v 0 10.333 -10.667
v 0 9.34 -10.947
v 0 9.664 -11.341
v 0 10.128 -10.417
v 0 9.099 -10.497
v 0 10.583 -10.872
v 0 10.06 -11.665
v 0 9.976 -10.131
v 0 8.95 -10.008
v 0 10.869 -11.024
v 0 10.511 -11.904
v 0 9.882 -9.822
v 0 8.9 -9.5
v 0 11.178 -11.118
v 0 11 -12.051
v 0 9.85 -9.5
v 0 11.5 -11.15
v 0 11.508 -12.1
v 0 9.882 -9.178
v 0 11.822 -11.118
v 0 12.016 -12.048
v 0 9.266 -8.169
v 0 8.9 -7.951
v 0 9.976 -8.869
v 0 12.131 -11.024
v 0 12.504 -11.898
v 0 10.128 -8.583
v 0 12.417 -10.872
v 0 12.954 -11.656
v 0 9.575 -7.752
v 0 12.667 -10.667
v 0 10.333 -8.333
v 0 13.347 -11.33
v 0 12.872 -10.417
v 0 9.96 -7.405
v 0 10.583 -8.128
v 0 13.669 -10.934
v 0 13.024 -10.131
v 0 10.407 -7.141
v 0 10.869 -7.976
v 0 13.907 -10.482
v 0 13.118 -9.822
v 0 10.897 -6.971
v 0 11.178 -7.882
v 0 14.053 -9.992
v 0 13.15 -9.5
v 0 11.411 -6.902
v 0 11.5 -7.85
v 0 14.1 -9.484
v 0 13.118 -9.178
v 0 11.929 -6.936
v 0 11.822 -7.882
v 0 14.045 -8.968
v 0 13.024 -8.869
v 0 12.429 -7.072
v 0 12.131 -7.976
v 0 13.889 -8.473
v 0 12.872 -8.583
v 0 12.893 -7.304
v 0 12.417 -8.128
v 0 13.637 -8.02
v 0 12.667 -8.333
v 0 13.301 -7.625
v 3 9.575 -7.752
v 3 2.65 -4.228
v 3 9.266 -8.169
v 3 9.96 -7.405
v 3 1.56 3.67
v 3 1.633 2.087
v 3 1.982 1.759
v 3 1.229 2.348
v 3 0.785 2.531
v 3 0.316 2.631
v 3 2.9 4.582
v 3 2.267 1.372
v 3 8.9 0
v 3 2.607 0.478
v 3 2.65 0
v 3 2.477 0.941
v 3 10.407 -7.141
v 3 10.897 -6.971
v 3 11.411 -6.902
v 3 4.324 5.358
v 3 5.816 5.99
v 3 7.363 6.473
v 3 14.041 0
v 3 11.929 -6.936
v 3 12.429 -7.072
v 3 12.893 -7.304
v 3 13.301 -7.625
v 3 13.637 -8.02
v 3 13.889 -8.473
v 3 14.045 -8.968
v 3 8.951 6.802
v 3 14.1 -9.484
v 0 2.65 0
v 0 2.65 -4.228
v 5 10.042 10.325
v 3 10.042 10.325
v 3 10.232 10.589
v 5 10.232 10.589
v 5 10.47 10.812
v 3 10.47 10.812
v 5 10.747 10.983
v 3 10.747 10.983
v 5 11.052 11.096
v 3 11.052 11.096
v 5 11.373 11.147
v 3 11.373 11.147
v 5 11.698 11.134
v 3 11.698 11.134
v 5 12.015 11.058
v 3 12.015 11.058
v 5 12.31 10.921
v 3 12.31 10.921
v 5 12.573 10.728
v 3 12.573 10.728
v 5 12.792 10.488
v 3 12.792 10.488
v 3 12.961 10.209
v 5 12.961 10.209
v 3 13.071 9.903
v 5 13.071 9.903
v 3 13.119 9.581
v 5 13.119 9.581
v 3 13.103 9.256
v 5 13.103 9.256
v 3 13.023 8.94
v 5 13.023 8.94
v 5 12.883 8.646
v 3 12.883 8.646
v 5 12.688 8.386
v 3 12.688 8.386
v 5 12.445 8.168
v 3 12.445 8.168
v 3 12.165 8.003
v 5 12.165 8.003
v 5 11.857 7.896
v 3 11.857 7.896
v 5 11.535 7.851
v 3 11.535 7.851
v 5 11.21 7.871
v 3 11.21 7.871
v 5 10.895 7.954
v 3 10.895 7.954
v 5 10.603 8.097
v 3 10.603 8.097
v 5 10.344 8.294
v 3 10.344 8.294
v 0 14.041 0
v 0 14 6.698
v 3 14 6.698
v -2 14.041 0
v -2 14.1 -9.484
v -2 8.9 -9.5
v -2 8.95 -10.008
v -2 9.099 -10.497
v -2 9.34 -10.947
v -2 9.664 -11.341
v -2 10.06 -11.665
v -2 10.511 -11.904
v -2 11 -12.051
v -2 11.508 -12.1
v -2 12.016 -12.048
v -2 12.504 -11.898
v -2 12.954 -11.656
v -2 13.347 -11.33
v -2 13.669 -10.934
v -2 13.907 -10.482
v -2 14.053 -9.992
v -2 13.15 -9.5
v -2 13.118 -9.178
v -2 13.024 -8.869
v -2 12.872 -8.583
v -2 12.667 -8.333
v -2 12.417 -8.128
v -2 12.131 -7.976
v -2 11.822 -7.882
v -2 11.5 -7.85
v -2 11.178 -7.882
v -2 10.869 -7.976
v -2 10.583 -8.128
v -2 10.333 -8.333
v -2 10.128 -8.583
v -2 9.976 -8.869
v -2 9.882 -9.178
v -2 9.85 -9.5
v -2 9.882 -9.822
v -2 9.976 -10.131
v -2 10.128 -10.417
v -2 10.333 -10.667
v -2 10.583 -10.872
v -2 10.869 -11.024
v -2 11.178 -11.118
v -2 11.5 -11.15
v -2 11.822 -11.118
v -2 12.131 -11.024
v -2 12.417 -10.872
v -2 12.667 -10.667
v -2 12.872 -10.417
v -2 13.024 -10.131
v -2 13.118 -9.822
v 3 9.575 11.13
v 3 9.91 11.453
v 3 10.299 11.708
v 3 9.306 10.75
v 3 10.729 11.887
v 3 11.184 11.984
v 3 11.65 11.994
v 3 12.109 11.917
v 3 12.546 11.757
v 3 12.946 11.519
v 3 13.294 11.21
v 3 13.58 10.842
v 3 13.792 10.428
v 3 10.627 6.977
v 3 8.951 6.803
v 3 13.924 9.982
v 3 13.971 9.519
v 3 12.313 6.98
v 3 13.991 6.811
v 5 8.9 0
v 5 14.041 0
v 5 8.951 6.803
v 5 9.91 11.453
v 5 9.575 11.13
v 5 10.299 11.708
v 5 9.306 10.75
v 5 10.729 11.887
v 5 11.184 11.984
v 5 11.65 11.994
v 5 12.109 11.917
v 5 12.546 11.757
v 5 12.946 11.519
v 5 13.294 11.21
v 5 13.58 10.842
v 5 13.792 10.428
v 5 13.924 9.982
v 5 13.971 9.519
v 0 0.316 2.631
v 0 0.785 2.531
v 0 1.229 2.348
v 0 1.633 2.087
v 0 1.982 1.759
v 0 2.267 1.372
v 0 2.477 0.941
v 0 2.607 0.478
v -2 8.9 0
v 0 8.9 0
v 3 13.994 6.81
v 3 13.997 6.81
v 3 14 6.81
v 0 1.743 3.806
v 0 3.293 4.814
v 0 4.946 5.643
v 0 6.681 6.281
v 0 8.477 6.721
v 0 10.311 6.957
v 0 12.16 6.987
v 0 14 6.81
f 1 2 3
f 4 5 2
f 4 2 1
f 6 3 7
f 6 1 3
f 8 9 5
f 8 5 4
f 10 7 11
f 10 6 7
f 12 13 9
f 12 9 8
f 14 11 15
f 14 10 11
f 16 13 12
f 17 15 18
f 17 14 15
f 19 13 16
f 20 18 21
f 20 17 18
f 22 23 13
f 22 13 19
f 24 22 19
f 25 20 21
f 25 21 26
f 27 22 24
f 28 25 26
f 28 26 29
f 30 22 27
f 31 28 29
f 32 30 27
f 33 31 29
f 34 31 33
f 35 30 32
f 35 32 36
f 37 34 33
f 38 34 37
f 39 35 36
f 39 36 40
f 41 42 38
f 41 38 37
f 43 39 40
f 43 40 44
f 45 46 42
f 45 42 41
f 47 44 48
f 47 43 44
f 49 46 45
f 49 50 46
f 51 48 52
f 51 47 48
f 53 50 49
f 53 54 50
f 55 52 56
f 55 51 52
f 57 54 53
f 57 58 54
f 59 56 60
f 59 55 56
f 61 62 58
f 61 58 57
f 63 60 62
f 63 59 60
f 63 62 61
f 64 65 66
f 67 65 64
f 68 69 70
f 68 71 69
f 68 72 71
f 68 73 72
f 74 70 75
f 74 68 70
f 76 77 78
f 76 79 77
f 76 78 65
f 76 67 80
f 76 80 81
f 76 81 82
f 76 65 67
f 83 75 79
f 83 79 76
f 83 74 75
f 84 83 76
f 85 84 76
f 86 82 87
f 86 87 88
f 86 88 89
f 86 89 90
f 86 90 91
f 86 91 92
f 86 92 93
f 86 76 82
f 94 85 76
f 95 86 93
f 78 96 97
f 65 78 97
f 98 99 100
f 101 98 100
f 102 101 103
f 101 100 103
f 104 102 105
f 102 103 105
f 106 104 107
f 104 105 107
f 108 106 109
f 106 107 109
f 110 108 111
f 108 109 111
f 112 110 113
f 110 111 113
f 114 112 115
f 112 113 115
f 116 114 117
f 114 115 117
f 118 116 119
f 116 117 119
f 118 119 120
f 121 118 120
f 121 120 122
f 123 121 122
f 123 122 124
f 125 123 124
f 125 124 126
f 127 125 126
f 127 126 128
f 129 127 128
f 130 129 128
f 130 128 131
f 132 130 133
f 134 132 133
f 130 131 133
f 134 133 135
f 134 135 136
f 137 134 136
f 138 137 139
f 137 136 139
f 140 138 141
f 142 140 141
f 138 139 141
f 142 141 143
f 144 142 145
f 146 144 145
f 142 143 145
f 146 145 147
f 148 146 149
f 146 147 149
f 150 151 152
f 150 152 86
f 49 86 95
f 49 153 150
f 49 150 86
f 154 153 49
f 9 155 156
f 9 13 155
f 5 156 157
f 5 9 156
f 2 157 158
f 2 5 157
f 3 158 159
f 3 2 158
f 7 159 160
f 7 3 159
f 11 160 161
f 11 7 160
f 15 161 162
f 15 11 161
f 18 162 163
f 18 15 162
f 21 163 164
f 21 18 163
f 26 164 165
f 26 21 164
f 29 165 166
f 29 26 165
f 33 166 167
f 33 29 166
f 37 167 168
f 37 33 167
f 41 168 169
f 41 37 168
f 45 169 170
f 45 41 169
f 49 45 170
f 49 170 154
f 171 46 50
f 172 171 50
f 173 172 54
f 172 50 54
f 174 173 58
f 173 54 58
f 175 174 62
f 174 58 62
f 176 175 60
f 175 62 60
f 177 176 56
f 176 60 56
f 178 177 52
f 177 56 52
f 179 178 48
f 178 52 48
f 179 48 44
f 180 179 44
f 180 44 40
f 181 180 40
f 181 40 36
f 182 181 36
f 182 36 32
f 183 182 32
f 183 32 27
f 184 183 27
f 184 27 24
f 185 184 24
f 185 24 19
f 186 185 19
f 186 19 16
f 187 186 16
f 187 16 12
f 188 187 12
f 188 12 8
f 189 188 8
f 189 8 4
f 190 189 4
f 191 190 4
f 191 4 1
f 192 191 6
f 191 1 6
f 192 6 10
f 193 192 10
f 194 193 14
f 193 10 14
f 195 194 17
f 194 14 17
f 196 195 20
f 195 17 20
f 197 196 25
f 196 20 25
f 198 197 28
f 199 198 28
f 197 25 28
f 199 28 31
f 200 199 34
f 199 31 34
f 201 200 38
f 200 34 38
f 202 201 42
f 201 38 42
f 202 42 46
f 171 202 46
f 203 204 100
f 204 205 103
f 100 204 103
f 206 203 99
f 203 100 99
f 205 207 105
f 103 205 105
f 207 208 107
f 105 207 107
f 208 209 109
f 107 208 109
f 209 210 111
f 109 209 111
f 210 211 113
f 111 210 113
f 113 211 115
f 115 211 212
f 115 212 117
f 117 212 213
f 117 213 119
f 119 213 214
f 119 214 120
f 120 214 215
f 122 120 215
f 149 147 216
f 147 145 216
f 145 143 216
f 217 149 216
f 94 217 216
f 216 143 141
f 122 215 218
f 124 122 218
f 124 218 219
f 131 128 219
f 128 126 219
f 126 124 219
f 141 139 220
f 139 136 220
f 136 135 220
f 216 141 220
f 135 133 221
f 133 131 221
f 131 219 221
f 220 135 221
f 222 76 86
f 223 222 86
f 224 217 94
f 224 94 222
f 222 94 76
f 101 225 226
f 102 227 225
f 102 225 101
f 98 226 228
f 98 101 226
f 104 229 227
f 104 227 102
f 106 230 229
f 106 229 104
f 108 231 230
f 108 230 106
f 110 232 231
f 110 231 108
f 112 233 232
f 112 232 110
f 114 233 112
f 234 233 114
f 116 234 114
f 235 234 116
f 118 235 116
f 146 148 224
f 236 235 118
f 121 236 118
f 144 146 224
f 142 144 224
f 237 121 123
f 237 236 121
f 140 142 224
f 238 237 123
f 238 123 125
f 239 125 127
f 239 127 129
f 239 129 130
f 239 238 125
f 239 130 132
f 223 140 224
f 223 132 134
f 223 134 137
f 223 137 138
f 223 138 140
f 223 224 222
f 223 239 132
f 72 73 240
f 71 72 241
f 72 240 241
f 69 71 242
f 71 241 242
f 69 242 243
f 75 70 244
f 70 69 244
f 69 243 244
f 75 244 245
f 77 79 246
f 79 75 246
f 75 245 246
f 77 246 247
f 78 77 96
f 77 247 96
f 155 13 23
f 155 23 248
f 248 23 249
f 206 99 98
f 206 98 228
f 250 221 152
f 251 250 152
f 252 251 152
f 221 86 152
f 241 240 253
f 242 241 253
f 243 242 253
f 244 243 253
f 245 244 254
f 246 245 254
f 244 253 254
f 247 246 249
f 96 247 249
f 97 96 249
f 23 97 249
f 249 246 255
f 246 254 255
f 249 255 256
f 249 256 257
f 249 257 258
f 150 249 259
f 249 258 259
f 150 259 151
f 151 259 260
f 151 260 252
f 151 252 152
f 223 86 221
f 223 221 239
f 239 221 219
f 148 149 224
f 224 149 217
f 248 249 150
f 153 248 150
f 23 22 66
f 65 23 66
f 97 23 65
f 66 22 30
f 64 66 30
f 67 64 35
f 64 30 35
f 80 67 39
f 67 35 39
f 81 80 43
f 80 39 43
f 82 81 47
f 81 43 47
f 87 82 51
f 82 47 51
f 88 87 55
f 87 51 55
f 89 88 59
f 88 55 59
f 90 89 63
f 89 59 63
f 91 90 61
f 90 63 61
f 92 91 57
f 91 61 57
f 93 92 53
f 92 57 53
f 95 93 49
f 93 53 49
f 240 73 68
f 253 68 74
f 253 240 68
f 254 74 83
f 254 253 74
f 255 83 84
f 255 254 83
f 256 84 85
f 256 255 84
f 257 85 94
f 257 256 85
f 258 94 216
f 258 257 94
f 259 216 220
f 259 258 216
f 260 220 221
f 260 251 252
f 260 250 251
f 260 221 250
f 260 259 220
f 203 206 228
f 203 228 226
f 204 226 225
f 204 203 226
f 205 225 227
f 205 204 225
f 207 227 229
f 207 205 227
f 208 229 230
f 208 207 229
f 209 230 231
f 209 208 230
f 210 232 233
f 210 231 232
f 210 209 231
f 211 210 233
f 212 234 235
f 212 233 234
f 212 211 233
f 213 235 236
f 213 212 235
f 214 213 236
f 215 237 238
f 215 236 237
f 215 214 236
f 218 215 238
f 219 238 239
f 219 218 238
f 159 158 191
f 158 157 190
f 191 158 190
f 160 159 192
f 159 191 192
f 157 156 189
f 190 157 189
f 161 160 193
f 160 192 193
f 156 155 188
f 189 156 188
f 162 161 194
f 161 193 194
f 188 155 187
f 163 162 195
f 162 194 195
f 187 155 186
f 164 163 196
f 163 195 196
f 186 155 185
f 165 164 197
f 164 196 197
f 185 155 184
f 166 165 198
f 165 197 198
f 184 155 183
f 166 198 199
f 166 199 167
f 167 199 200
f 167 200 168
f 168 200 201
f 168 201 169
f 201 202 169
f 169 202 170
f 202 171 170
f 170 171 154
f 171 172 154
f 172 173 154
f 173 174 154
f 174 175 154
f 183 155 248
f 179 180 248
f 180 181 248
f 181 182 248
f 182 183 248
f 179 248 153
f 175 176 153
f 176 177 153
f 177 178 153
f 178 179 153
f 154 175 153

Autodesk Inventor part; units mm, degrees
ref_plane "YZ Plane" through (0, 0, 0) normal (1, 0, 0) x (0, 1, 0)
ref_plane "XZ Plane" through (0, 0, 0) normal (0, 1, 0) x (-1, 0, 0)
ref_plane "XY Plane" through (0, 0, 0) normal (0, 0, 1) x (1, 0, 0)
sketch "スケッチ1" plane through (0, 0, 0) normal (1, 0, 0) x (0, 1, 0)
  line L0 (0, 0) -> (0, 6)
  line L1 (0, 6) -> (0, -6)
  line L2 (0, 0) -> (11.5, 0)
  line L3 (11.5, 0) -> (11.5, 9.5)
  line L4 (11.5, 9.5) -> (11.5, -9.5)
  circle A0 centre (0, 6) radius 1.25
  circle A1 centre (0, -6) radius 1.25
  circle A2 centre (11.5, 9.5) radius 1.65
  circle A3 centre (11.5, -9.5) radius 1.65
  circle A4 centre (11.5, 9.5) radius 2.5
  circle A5 centre (11.5, -9.5) radius 2.5
  circle A6 centre (0, 0) radius 2.65
  line L5 (0, 0) -> (-14.6, 0)
  circle A7 centre (-14.6, 0) radius 1.65
  circle A8 centre (-14.6, 0) radius 2.5
  circle A9 centre (0, 6) radius 2
  circle A10 centre (0, -6) radius 2
  line L6 (0, 8) -> (10.6499, 11.851)
  line L7 (0, -8) -> (10.6499, -11.851)
  line L8 (-14.6, 0) -> (-14.6, -2.5)
  line L9 (-14.6, 0) -> (-12.1, 0) construction
  line L10 (-14.6, -2.5) -> (-14.6, 2.5)
  line L11 (-14.6, -2.5) -> (-0.7212, -7.8655)
  line L12 (-14.6, 2.5) -> (-0.7212, 7.8655)
  circle A11 centre (11.5, -9.5) radius 14.9164
  line L13 (11.5, -9.5) -> (0, 0)
  line L14 (11.5, -9.5) -> (0, -2.65)
  line L15 (14, 9.5) -> (14, 6.6979)
  circle A12 centre (11.5, -9.5) radius 16.7294
  circle A13 centre (11.5, -9.5) radius 2.6
  circle A14 centre (11.5, -9.5) radius 16.5
  line L16 (14, 6.6979) -> (14.1, -9.4839)
  line L17 (8.9, -9.5) -> (8.9, 0)
  line L18 (9, 9.5) -> (9, 0)
  line L19 (14.0414, 0) -> (11.5, 0)
  line L20 (2.65, 0) -> (2.65, -4.2285)
  point P0 (9.3522, -8.2206)
  point P1 (0, 2.65)
  point P2 (12.4812, 7.2006)
  point P3 (14, 6.8095)
  point P4 (0.3158, 2.6311)
  point P5 (9.2662, -8.1695)
  dimension "d9" = 5
  dimension "d0" = 6
  dimension "d1" = 12
  dimension "d2" = 11.5
  dimension "d3" = 9.5
  dimension "d4" = 19
  dimension "d5" = 2.5
  dimension "d6" = 3.3
  dimension "d7" = 3.3
  dimension "d8" = 5
  dimension "d10" = 5.3
  dimension "d11" = 14.6
  dimension "d12" = 3.3
  dimension "d13" = 5
  dimension "d14" = 4
  dimension "d15" = 4
  dimension "d16" = 90
  dimension "d21" = 5.2
  dimension "d22" = 33
extrude "押し出し3" add sketch "スケッチ1" along normal blind 3 contours A6 A11 L18 L2 | L2 L17 L13 L20 | A6 A14 L18 A11 | L20 L13 L17 L14 | L2 L4 A13 L13 L17 | L18 A14 L3 A11 | A11 L3 L2 L18 | L17 L13 A13 L14 | A11 L16 L19 L3 | L3 A14 L15 L16 A11 | L19 L16 A13 L4
extrude "押し出し4" add sketch "スケッチ1" against normal blind 2 contours L2 L4 A13 L13 L17 | L17 L13 A13 L14 | L14 A13 L17 | A13 L13 A5 L14 | L14 A5 L7 A13 | L19 L16 A13 L4 | A13 L4 A5 L13 | L7 A5 L4 A13 | L14 A3 L4 A5 | A5 L13 A3 L14 | A5 L4 A3 L13
sketch "スケッチ2" plane through (3, 0, 0) normal (1, 0, 0) x (0, 0, -1)
  line L0 (0, 0) -> (0, 11.4707)
  line L1 (0, 14.0414) -> (0, 8.9) projected
  line L2 (0, 11.4707) -> (-9.5, 11.4707)
  circle A0 centre (-9.5, 11.4707) radius 1.65
  circle A1 centre (-9.5, 11.4707) radius 2.5
  line L3 (-9.5186, 8.9708) -> (0, 8.9)
  line L4 (0, 11.4707) -> (0, 14.0414)
  line L5 (0, 14.0414) -> (-6.6979, 14) projected
  line L6 (0, 14.0414) -> (-9.5186, 13.9706)
  line L7 (-9.5, 11.4707) -> (-6.8033, 8.9506)
  line L8 (-9.5, 11.4707) -> (-12, 11.4707)
  line L9 (0, 8.9) -> (7.9513, 8.9) projected
  line L10 (-9.5, 11.4707) -> (-10.75, 9.3056)
  point P0 (-11.15, 11.4707)
  point P1 (-8.2945, 10.3441)
  point P2 (-10.325, 10.0417)
  dimension "d27" = 9.5
  dimension "d28" = 3.3
  dimension "d29" = 5
extrude "押し出し5" add sketch "スケッチ2" along normal blind 2 contours L3 L7 A1 L2 L0 | L2 A1 L6 L1 | A1 L7 A0 L2 | L2 A0 L8 A1 | A1 L8 A0 L10
properties part number "ikafly2c"
